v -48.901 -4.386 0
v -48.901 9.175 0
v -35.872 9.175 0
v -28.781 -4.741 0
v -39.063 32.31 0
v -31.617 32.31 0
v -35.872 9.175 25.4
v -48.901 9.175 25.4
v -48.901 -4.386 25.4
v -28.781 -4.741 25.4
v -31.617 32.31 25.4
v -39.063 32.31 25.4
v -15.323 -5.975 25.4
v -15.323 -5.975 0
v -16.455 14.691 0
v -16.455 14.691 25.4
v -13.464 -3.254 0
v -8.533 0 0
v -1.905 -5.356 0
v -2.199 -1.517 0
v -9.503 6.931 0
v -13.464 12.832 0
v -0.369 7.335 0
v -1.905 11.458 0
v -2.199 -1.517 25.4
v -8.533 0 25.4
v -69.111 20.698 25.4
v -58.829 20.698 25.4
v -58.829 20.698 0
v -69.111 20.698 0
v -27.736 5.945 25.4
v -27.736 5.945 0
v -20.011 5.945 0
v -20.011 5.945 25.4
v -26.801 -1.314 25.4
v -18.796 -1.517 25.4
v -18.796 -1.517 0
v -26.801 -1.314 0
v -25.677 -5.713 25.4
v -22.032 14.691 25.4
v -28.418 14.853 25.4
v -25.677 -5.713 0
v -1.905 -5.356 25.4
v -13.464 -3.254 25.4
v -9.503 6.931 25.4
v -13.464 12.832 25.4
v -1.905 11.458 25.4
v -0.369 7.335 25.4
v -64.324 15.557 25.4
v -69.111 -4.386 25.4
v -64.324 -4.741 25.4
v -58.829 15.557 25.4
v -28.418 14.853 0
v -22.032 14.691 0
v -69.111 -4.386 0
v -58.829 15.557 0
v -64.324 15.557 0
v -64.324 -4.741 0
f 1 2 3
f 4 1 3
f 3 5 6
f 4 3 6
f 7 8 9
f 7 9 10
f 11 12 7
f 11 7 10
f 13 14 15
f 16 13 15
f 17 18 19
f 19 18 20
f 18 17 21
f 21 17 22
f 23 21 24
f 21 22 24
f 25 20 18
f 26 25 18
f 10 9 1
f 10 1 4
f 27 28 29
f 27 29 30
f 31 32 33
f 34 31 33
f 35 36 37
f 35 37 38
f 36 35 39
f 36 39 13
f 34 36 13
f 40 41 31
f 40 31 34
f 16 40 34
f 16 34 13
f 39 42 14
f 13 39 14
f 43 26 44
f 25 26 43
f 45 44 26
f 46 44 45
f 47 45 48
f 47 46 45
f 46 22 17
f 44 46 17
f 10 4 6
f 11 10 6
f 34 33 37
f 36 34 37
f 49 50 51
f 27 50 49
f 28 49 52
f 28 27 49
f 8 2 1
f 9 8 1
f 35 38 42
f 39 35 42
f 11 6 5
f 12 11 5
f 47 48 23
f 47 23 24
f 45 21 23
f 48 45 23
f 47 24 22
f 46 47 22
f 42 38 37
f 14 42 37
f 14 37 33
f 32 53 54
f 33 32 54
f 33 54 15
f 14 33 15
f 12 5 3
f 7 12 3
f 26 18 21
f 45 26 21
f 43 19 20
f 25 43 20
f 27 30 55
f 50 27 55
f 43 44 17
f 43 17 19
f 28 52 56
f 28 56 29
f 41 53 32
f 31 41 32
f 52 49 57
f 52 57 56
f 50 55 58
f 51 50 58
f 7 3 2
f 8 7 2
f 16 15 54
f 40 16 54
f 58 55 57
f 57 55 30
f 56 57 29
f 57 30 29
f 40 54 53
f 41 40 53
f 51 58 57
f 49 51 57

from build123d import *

# Parameters (mm, degrees)
F1_DEPTH = 25.4


# Not quite as in the source:
# - a feature of the source that left no trace in its solid (it failed there, or was rolled back) is left out


with BuildPart() as f1:
    # F0 (on Top) → F1 (new body)
    with BuildSketch(Plane.XY):
        Polygon((-58.8288158178, 20.6982176751), (-69.1107288003, 20.6982176751), (-69.1107288003, -4.3861074373), (-64.3243193626, -4.7406563535), (-64.3243193626, 15.5572602525), (-58.8288158178, 15.5572602525), align=None)
    extrude(amount=F1_DEPTH)


with BuildPart() as f1b:
    # F0 (on Top) → F1, piece 2 (new body)
    with BuildSketch(Plane.XY):
        Polygon((-35.8717851341, 9.1753825545), (-41.1013774574, 9.1753825545), (-48.9014498889, 9.1753825545), (-48.9014498889, -4.3861074373), (-28.7808086723, -4.7406563535), (-31.6171981394, 32.3096886277), (-39.0627235174, 32.3096886277), align=None)
    extrude(amount=F1_DEPTH)


with BuildPart() as f1c:
    # F0 (on Top) → F1, piece 3 (new body)
    with BuildSketch(Plane.XY):
        Polygon((-16.4547897875, 14.6912075579), (-22.0323093235, 14.6912075579), (-28.418160975, 14.8528749123), (-27.7362425849, 5.9453141228), (-20.0114697218, 5.9453141228), (-18.7959093807, -1.5165152081), (-26.8014892936, -1.3138420181), (-25.6768274582, -5.7131264287), (-15.3231201693, -5.9752459638), align=None)
    extrude(amount=F1_DEPTH)


with BuildPart() as f1d:
    # F0 (on Top) → F1, piece 4 (new body)
    with BuildSketch(Plane.XY):
        Polygon((-8.5331005976, 0), (-9.5031037927, 6.9311829284), (-0.3689071746, 7.3353513144), (-1.9047448877, 11.4578641951), (-13.463947922, 12.8320353106), (-13.463947922, -3.2538492233), (-1.9047448877, -5.3555215709), (-2.1986400516, -1.5165152081), align=None)
    extrude(amount=F1_DEPTH)


solid = Compound([f1.part, f1b.part, f1c.part, f1d.part])
